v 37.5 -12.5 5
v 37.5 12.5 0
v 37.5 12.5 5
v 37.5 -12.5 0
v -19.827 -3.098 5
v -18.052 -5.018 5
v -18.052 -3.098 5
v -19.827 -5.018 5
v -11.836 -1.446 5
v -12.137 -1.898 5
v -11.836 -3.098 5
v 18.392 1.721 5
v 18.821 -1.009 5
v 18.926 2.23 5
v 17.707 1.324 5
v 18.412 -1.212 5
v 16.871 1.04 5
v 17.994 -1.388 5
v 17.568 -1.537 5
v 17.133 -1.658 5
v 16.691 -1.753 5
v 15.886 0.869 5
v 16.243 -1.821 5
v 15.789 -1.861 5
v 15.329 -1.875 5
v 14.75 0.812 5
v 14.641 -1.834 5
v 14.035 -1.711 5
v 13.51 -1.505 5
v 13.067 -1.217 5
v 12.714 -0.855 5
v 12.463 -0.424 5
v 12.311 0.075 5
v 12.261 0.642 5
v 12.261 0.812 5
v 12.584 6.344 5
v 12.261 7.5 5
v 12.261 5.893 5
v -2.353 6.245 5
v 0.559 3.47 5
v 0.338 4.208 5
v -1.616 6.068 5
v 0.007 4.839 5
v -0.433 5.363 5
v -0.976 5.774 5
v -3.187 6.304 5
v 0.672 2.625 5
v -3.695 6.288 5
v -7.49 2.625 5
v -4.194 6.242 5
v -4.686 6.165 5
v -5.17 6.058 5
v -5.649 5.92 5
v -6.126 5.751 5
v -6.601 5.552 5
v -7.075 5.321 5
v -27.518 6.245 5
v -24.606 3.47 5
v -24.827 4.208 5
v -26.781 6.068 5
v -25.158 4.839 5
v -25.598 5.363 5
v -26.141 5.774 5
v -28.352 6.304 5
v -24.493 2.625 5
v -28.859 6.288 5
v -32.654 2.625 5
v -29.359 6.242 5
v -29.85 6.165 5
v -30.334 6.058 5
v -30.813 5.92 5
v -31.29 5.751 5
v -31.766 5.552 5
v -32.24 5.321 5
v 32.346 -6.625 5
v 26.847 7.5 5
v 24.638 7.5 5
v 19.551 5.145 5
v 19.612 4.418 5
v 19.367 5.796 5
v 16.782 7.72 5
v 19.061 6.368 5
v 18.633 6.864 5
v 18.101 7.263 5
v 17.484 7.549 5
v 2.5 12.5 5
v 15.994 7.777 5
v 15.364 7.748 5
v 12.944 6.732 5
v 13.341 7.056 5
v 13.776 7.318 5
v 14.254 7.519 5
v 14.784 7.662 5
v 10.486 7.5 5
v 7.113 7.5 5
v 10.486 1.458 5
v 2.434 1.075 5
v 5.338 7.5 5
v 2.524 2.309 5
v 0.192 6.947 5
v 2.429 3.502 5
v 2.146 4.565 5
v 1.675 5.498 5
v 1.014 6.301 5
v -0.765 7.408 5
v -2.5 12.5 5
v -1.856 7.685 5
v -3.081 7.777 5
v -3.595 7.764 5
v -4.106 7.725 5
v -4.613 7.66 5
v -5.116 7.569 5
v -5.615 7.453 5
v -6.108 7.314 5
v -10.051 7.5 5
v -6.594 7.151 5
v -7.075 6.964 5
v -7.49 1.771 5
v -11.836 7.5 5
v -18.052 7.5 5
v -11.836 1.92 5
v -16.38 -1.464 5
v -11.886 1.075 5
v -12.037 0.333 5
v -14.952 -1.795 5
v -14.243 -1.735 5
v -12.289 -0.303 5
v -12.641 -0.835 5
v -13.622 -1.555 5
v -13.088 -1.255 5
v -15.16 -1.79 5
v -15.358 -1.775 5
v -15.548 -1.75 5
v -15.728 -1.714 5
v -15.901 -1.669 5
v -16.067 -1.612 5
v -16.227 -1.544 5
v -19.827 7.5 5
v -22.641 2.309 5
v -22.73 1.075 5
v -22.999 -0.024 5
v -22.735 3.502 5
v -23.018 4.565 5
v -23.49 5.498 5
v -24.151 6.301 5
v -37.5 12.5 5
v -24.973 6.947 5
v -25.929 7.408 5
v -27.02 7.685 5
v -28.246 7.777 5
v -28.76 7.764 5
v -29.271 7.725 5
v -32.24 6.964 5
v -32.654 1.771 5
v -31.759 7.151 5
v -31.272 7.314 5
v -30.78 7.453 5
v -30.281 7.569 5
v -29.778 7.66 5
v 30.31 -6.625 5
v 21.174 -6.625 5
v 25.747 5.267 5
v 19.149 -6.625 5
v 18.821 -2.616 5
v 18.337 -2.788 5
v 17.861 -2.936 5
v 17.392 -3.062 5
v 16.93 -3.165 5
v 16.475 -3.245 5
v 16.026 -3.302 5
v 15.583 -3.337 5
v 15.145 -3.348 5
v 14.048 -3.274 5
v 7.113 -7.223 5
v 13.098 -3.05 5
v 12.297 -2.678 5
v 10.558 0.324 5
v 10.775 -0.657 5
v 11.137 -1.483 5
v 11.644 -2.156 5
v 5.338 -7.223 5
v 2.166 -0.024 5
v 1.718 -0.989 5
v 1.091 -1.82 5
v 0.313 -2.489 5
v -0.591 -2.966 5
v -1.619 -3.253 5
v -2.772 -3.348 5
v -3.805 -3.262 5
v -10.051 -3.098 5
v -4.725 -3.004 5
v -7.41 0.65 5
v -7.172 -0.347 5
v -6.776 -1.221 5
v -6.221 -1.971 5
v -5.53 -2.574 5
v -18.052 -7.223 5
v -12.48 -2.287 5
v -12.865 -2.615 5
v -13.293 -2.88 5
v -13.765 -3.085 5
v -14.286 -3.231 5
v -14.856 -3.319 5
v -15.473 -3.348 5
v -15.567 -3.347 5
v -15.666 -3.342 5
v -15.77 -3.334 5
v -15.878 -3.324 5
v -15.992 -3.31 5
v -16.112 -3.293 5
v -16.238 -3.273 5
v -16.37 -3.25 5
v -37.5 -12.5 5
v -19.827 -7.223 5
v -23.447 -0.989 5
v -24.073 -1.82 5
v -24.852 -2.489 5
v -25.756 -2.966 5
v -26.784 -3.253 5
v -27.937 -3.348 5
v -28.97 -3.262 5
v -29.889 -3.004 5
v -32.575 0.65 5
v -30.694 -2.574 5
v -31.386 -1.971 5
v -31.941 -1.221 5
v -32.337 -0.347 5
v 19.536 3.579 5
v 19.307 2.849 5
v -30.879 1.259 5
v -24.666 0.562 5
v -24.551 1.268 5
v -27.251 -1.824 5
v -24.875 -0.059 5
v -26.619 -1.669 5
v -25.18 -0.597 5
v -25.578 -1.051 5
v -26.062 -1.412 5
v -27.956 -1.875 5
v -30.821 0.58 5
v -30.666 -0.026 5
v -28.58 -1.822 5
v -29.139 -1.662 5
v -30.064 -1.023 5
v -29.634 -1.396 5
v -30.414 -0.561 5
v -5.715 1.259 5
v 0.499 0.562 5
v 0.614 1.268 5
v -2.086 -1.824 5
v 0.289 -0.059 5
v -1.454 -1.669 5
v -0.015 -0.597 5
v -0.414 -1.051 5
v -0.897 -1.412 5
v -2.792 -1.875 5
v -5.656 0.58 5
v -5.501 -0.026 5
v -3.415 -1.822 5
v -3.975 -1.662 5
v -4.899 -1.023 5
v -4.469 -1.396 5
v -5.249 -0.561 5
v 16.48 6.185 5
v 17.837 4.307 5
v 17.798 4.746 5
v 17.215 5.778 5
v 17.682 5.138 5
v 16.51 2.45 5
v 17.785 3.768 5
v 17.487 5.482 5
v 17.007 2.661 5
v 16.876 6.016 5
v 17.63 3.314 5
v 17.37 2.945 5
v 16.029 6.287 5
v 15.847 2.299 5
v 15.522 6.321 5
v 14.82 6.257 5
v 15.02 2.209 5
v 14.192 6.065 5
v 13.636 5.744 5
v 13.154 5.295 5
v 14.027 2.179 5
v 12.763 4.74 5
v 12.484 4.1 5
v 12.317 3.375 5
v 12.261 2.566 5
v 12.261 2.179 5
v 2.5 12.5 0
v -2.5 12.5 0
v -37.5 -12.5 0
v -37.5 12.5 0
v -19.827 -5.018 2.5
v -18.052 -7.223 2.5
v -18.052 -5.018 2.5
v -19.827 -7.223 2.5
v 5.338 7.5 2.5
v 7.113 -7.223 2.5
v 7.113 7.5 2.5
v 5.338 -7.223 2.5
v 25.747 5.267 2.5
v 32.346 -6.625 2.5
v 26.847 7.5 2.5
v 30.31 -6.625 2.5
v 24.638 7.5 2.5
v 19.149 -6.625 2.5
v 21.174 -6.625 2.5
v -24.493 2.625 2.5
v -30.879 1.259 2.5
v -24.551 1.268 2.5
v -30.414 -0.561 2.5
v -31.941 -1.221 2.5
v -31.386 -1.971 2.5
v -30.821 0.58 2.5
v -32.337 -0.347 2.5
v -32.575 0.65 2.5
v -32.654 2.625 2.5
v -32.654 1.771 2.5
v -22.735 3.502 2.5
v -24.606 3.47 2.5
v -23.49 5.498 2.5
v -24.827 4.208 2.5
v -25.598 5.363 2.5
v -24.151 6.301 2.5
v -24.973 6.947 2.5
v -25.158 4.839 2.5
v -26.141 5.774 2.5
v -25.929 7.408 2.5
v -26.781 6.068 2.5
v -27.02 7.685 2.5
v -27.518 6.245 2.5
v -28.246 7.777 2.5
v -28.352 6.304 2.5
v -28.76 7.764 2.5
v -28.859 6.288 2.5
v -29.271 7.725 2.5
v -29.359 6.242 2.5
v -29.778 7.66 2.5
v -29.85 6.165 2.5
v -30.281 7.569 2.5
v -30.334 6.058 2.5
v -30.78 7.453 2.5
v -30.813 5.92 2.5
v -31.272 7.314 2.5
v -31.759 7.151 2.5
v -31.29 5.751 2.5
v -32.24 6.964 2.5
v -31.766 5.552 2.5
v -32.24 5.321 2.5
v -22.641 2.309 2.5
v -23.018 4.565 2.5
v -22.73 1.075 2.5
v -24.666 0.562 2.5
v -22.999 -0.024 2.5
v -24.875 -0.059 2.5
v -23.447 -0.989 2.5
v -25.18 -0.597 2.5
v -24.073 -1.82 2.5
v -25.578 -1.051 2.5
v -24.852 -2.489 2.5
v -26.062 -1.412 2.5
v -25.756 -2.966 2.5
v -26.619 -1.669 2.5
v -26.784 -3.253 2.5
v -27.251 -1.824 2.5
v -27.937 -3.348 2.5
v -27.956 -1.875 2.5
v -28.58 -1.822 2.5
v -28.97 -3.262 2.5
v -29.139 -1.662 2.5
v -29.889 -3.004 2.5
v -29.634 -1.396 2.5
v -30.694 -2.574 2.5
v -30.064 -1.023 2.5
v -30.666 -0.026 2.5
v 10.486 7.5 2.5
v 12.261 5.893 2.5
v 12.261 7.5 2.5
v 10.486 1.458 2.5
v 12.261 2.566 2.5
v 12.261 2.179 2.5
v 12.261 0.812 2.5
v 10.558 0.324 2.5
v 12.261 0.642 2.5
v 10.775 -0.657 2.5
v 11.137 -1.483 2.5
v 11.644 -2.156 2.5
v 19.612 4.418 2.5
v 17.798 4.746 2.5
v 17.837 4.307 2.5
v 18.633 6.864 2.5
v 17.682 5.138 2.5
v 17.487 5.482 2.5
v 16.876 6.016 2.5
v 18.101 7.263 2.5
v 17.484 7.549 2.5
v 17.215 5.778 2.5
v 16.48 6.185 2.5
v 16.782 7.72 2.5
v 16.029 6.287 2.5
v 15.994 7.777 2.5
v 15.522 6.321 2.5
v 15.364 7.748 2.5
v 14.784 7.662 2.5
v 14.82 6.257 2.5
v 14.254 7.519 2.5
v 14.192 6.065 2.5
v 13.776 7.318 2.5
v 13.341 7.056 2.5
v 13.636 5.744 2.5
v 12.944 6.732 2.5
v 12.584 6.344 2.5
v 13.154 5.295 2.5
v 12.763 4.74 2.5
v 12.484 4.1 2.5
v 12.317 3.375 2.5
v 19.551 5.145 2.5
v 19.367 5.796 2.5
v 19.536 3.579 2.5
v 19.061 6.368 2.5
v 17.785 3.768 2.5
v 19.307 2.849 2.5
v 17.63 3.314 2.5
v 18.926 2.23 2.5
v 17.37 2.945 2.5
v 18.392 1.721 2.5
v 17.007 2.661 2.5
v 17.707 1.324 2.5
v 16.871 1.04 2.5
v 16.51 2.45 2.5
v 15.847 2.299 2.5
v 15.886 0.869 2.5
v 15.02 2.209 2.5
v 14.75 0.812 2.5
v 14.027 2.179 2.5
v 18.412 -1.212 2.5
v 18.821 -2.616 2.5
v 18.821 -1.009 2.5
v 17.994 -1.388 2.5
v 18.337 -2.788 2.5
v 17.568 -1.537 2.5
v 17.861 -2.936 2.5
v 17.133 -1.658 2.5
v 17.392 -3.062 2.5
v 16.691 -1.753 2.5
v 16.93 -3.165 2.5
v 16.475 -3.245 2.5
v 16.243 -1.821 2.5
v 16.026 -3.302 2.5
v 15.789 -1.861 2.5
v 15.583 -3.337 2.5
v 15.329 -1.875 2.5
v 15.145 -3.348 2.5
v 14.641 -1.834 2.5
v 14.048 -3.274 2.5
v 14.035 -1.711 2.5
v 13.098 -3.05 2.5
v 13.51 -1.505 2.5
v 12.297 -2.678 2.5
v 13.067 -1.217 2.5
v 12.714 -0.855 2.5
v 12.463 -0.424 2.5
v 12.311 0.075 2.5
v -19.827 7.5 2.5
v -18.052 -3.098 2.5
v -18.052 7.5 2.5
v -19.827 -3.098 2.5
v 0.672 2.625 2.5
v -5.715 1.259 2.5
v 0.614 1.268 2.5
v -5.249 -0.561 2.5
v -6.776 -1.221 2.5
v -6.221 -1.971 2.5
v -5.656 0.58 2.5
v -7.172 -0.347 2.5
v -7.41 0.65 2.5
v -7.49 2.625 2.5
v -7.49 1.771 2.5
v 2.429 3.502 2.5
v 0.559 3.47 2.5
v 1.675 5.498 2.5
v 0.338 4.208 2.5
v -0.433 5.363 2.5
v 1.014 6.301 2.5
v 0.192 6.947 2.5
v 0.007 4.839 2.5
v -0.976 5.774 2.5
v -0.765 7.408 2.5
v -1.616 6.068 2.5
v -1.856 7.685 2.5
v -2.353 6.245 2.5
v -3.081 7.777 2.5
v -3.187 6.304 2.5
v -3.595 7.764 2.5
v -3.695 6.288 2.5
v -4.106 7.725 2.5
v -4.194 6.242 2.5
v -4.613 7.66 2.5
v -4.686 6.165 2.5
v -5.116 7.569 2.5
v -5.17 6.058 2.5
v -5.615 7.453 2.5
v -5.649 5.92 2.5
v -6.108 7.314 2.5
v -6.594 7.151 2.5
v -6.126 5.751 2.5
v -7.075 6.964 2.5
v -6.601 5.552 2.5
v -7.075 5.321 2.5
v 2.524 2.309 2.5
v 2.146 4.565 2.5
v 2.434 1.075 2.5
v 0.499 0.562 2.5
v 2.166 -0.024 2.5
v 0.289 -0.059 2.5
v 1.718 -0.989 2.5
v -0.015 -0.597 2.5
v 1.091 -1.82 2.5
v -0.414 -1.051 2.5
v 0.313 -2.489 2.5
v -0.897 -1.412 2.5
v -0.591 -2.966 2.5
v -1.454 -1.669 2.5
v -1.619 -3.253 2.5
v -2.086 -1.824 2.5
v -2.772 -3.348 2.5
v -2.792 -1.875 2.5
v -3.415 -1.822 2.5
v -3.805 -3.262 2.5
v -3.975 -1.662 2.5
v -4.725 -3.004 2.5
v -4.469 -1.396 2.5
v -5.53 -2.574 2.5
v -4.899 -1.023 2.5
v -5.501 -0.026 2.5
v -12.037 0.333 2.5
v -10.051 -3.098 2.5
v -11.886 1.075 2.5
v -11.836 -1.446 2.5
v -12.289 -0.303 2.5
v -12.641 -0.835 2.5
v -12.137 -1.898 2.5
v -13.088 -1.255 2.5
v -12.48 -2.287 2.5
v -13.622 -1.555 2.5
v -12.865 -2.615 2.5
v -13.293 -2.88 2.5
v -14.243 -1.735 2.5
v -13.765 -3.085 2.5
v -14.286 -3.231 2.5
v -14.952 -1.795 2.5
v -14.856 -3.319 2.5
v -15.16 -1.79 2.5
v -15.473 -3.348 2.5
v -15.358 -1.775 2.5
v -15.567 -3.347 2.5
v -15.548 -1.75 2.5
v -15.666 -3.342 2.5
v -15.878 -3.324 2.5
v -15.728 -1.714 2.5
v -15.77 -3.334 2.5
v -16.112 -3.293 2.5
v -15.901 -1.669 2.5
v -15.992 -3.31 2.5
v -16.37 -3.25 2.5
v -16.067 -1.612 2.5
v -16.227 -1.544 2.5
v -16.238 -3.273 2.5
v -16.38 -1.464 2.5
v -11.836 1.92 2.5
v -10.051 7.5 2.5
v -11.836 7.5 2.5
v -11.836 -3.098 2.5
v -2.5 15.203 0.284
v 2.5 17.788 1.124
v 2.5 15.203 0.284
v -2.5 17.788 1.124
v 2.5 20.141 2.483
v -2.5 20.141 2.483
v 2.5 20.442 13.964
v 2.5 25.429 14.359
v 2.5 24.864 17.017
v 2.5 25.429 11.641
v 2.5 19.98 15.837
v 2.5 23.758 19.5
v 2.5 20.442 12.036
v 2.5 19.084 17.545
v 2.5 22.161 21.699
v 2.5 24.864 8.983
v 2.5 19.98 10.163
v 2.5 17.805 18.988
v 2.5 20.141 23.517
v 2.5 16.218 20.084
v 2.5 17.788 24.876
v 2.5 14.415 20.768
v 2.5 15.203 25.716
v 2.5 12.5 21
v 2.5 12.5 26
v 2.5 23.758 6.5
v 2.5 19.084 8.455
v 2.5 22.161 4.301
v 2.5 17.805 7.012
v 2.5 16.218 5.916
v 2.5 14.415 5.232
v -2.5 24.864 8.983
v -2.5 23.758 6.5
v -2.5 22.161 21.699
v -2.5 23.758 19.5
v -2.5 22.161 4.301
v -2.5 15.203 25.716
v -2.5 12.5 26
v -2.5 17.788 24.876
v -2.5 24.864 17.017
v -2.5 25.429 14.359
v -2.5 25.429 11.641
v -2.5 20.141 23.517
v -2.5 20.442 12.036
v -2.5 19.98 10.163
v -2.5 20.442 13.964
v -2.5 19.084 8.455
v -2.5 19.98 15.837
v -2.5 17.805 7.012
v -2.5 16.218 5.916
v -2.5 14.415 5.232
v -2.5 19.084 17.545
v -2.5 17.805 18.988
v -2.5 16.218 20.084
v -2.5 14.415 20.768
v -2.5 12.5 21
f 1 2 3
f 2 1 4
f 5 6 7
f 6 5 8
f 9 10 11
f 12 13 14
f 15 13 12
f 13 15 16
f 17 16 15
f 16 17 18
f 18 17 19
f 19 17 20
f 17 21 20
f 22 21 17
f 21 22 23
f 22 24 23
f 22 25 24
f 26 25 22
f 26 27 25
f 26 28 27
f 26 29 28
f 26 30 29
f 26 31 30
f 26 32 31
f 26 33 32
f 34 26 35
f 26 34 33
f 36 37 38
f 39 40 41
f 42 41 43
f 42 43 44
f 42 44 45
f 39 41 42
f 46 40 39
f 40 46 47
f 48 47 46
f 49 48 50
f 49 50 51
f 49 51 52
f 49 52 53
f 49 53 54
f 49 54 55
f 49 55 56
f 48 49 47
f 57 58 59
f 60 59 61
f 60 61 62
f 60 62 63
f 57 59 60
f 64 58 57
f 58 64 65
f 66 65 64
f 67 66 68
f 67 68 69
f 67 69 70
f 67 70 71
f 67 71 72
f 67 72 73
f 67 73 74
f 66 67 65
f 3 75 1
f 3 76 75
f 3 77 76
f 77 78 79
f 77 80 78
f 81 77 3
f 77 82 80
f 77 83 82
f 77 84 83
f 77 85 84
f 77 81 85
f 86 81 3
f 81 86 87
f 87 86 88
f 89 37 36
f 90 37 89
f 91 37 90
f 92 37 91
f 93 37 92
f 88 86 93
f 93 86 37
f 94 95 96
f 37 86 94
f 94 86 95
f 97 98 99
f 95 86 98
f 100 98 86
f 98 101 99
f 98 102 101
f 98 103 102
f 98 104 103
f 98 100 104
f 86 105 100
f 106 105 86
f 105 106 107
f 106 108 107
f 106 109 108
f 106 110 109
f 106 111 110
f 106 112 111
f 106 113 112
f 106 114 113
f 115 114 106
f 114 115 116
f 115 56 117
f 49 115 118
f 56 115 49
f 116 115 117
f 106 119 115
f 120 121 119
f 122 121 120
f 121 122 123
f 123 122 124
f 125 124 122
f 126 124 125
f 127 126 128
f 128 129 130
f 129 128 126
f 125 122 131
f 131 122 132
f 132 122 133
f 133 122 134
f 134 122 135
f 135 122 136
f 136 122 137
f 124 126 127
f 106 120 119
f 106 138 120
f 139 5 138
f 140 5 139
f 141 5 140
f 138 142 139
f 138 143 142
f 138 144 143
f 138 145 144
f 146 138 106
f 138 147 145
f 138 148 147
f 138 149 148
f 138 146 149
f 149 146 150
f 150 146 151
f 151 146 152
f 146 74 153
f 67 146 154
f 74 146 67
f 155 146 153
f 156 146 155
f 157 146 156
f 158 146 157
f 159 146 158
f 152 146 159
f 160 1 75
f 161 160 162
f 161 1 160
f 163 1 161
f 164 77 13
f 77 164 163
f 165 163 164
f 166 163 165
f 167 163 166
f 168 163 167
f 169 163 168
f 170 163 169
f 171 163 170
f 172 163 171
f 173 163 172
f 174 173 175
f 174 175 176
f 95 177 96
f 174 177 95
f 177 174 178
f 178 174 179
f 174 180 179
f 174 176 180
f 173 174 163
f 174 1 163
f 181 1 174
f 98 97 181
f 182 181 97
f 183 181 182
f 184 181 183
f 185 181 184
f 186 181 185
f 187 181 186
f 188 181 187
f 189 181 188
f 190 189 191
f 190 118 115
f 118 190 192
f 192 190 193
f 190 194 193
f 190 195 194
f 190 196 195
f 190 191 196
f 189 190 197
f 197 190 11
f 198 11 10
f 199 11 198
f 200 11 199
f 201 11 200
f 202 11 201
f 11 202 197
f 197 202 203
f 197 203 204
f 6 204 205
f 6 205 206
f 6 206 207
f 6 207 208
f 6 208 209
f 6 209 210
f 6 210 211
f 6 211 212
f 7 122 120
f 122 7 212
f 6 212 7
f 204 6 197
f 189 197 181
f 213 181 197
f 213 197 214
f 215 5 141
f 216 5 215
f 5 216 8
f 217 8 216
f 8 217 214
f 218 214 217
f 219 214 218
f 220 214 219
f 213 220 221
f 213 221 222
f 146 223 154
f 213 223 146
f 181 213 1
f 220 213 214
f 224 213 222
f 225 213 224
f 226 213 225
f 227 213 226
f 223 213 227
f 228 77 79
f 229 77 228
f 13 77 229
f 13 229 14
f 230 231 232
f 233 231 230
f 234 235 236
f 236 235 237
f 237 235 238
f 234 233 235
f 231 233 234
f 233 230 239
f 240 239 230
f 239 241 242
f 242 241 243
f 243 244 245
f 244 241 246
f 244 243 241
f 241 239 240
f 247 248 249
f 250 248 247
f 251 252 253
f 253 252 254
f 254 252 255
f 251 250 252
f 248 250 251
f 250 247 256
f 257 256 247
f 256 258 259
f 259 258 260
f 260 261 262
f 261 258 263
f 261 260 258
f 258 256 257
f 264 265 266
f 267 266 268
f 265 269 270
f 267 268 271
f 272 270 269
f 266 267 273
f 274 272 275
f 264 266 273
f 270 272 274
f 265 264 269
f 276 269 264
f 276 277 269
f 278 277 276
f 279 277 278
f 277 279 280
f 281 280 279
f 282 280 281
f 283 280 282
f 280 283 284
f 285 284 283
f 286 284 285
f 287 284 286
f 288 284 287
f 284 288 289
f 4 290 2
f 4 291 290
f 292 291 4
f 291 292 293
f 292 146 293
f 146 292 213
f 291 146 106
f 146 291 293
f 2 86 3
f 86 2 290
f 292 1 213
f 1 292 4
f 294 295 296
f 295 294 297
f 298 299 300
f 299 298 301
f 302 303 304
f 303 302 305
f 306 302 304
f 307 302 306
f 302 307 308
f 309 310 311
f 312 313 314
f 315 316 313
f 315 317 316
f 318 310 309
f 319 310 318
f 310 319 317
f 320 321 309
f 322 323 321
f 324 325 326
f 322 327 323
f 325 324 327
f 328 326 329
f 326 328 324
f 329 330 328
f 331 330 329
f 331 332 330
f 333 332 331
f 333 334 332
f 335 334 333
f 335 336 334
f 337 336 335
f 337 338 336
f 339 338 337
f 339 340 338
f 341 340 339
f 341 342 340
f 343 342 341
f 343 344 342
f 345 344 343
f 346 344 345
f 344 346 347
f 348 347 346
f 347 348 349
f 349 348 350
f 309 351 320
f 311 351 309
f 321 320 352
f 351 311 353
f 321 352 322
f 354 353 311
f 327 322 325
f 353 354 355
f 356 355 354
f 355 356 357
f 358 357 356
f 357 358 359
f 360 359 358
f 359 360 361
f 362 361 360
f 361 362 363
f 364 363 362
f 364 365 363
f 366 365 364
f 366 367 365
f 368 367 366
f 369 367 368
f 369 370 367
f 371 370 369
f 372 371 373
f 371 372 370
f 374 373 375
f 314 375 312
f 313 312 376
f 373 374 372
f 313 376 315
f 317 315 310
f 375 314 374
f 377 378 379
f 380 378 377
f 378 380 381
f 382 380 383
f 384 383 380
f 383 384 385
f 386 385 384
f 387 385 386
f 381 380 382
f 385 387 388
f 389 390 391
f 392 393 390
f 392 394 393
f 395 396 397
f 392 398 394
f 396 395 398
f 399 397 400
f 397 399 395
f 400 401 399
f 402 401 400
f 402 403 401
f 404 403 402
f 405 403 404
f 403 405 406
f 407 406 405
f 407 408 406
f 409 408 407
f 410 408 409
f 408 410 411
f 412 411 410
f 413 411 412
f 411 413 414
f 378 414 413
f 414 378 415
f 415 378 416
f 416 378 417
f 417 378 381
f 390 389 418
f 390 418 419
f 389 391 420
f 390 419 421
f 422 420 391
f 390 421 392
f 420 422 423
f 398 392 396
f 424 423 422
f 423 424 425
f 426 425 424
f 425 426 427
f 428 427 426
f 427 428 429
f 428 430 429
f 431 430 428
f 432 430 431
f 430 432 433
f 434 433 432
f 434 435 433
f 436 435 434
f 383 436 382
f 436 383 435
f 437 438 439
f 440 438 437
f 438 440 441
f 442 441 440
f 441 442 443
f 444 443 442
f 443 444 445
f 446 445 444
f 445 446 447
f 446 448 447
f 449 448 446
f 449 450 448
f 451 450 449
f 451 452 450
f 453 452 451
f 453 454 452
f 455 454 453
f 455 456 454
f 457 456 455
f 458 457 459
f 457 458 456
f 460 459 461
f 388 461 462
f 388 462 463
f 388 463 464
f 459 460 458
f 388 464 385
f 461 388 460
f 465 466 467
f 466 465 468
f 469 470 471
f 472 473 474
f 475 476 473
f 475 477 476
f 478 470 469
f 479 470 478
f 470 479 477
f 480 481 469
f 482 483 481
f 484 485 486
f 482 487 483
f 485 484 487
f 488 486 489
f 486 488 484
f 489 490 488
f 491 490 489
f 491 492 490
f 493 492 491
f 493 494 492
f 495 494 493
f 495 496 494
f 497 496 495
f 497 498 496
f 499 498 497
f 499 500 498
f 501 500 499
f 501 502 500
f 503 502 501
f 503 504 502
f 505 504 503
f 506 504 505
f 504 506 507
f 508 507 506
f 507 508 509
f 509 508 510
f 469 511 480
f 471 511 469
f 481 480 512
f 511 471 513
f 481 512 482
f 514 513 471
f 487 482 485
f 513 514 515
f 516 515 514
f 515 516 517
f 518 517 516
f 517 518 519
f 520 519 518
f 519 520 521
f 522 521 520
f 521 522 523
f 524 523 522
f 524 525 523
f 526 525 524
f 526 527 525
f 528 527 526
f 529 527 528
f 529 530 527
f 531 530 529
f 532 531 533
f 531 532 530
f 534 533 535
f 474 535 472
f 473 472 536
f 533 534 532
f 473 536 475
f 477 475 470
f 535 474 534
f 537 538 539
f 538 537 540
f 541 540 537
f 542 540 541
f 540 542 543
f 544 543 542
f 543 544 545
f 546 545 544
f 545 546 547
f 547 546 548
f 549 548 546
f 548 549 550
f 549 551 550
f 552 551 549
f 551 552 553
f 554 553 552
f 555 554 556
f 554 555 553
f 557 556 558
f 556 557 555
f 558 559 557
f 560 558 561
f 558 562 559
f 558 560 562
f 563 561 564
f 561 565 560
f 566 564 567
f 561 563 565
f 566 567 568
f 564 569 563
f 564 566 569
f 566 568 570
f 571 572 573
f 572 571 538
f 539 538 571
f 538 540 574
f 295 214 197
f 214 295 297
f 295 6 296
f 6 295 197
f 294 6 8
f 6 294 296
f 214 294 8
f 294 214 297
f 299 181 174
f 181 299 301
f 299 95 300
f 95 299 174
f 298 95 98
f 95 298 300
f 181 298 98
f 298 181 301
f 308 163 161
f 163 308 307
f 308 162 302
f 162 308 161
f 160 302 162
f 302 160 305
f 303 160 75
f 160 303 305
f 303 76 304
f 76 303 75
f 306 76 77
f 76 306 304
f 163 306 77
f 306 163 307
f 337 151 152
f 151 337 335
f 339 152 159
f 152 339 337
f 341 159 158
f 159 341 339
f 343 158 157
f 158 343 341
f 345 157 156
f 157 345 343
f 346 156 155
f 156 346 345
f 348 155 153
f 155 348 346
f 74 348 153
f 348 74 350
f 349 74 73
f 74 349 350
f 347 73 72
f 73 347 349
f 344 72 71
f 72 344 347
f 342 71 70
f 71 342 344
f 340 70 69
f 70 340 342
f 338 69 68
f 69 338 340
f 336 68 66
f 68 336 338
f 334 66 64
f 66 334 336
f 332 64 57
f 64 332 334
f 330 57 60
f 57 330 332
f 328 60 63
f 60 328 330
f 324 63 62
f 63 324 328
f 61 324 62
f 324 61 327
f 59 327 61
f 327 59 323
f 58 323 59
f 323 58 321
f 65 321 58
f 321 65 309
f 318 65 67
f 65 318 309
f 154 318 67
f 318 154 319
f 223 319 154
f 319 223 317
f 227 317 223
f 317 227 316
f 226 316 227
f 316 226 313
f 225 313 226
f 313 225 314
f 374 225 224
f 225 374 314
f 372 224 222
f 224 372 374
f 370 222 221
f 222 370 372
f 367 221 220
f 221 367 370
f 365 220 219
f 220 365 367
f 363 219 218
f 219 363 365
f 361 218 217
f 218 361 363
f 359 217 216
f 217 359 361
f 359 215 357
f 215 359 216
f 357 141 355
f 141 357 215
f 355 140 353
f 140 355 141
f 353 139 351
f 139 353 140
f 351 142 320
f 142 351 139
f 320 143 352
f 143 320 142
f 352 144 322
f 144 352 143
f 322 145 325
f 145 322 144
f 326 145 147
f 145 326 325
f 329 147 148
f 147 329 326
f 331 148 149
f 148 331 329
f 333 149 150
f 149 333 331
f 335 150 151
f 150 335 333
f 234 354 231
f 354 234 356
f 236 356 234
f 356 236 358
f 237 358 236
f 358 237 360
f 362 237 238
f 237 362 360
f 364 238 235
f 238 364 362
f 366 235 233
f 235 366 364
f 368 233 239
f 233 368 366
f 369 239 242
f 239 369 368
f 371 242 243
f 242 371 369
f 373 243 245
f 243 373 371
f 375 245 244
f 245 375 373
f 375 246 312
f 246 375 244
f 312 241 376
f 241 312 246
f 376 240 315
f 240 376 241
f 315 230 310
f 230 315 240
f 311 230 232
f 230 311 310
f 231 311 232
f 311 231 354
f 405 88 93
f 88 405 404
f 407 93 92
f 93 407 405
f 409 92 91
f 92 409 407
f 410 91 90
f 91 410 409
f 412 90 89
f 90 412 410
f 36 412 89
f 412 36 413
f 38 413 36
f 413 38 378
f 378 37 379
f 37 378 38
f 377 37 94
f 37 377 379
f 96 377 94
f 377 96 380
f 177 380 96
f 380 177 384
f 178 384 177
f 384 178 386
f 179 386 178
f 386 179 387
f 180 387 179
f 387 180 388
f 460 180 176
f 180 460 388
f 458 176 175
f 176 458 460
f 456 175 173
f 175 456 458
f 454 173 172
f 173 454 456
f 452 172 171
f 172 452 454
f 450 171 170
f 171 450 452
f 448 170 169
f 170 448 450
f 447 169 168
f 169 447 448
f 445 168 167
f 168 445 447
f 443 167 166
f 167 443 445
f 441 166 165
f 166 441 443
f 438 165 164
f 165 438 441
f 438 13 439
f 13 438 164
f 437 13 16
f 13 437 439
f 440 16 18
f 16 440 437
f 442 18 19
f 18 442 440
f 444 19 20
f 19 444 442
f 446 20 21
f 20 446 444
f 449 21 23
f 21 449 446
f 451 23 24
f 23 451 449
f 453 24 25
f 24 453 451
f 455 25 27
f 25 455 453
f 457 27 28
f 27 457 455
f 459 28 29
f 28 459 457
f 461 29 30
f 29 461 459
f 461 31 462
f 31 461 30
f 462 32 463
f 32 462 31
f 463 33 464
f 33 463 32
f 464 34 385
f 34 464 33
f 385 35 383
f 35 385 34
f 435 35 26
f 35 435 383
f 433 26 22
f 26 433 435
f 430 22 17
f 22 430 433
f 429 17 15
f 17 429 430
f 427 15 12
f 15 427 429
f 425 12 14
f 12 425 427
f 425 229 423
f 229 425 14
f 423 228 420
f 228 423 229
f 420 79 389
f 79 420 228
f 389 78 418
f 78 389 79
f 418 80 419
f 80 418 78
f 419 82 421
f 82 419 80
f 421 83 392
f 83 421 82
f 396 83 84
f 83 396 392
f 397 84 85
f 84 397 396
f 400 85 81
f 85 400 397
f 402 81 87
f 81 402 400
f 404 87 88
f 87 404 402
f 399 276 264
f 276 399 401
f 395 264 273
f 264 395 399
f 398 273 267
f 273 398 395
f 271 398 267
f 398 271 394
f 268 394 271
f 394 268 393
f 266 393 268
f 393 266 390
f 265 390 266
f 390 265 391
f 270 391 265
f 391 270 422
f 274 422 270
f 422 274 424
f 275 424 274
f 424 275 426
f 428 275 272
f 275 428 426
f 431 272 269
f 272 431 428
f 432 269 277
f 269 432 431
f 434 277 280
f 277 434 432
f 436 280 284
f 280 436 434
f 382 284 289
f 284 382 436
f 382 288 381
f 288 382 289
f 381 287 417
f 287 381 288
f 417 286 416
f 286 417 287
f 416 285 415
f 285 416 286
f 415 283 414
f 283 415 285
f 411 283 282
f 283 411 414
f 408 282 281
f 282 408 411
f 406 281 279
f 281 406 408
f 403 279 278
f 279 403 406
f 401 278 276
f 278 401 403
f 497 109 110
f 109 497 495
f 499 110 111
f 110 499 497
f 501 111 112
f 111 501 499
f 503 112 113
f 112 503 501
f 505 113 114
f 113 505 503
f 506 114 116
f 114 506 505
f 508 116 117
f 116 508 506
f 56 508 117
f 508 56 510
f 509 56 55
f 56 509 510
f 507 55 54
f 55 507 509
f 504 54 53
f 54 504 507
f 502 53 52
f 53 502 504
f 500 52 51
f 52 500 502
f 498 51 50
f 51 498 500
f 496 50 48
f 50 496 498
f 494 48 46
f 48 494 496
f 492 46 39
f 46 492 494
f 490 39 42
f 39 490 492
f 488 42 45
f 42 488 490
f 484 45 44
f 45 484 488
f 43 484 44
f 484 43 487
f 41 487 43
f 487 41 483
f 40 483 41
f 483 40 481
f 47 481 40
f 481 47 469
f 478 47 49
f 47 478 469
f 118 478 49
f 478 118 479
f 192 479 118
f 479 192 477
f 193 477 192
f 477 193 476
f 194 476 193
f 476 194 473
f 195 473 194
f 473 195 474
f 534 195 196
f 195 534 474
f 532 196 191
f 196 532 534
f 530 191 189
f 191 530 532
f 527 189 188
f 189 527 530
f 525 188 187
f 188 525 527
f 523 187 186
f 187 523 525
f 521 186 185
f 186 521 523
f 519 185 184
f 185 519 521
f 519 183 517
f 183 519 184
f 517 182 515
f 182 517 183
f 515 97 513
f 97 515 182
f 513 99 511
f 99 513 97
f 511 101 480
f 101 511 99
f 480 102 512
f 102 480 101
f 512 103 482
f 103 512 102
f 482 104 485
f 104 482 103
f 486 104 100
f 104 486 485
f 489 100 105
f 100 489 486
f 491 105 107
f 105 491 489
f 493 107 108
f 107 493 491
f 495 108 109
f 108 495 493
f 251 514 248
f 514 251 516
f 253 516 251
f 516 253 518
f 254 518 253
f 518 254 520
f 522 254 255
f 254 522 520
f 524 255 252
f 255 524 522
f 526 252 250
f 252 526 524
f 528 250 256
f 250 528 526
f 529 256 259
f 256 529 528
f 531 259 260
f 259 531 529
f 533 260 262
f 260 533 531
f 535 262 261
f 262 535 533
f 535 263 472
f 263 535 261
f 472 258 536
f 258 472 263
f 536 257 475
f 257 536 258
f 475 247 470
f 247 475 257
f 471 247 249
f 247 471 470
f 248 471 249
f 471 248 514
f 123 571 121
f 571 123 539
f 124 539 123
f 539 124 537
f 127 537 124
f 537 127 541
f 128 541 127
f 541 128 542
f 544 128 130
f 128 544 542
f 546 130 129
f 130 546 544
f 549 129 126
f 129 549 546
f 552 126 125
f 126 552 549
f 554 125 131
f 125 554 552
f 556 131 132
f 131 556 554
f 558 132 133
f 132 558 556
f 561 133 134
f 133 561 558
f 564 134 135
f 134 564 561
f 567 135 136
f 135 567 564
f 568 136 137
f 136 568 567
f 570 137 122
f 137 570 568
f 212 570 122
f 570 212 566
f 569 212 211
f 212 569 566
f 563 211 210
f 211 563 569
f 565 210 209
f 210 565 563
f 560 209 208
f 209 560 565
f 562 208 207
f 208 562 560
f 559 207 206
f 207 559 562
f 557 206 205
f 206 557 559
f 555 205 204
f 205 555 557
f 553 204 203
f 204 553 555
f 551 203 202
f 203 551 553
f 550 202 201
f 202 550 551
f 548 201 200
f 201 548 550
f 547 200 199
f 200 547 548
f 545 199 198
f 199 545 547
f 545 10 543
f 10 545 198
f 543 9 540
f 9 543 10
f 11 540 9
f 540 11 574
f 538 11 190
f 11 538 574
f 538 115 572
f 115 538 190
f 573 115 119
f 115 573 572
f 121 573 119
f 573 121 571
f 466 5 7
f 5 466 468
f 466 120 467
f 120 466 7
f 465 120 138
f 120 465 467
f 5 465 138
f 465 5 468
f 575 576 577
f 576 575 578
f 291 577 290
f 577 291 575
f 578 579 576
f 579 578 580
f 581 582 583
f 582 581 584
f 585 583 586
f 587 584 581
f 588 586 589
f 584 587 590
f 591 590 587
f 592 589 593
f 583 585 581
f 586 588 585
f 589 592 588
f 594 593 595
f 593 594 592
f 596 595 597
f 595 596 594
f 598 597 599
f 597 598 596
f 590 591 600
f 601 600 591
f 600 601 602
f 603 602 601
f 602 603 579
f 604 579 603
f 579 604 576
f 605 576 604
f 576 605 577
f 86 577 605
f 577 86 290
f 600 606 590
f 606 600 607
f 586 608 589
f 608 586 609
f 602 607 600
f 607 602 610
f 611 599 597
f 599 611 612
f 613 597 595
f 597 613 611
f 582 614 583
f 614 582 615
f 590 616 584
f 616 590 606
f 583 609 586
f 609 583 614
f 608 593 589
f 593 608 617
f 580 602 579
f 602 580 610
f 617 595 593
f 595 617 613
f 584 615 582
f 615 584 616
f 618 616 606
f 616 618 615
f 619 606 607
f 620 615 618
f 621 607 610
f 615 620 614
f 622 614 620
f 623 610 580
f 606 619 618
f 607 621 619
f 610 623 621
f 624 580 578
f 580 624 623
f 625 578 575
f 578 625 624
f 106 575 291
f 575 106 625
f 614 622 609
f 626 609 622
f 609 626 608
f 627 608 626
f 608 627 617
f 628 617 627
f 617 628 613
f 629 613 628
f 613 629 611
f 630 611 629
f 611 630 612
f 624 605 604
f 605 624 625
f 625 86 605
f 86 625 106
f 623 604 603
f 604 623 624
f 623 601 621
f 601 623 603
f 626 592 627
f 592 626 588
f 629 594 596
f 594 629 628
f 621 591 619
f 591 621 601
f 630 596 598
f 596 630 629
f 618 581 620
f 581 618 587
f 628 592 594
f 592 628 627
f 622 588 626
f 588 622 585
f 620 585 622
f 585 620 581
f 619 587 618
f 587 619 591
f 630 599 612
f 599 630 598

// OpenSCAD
name = "Valerie";

nameTag(name);

module nameTag(modText) {
    translate([0, 0, 2.5]) 
        difference() {
            cube([75, 25, 5], center = true);
            translate([32.5, 7.5, 0]) 
                resize(newsize=[65, 15, 10]) 
                    rotate([0,0,180]) 
                        linear_extrude(height = 5) 
                            text(modText, 10, "URW Gothic L");
        }

    translate([-2.5, 12.5, 13]) rotate([0, 90, 0]) difference() {
        cylinder(r = 13, h = 5);
        translate([0,0,-.5]) cylinder(r = 8, h = 6);
        translate([-15, -20, -0.5]) cube([30, 20, 6]);
    }
}
